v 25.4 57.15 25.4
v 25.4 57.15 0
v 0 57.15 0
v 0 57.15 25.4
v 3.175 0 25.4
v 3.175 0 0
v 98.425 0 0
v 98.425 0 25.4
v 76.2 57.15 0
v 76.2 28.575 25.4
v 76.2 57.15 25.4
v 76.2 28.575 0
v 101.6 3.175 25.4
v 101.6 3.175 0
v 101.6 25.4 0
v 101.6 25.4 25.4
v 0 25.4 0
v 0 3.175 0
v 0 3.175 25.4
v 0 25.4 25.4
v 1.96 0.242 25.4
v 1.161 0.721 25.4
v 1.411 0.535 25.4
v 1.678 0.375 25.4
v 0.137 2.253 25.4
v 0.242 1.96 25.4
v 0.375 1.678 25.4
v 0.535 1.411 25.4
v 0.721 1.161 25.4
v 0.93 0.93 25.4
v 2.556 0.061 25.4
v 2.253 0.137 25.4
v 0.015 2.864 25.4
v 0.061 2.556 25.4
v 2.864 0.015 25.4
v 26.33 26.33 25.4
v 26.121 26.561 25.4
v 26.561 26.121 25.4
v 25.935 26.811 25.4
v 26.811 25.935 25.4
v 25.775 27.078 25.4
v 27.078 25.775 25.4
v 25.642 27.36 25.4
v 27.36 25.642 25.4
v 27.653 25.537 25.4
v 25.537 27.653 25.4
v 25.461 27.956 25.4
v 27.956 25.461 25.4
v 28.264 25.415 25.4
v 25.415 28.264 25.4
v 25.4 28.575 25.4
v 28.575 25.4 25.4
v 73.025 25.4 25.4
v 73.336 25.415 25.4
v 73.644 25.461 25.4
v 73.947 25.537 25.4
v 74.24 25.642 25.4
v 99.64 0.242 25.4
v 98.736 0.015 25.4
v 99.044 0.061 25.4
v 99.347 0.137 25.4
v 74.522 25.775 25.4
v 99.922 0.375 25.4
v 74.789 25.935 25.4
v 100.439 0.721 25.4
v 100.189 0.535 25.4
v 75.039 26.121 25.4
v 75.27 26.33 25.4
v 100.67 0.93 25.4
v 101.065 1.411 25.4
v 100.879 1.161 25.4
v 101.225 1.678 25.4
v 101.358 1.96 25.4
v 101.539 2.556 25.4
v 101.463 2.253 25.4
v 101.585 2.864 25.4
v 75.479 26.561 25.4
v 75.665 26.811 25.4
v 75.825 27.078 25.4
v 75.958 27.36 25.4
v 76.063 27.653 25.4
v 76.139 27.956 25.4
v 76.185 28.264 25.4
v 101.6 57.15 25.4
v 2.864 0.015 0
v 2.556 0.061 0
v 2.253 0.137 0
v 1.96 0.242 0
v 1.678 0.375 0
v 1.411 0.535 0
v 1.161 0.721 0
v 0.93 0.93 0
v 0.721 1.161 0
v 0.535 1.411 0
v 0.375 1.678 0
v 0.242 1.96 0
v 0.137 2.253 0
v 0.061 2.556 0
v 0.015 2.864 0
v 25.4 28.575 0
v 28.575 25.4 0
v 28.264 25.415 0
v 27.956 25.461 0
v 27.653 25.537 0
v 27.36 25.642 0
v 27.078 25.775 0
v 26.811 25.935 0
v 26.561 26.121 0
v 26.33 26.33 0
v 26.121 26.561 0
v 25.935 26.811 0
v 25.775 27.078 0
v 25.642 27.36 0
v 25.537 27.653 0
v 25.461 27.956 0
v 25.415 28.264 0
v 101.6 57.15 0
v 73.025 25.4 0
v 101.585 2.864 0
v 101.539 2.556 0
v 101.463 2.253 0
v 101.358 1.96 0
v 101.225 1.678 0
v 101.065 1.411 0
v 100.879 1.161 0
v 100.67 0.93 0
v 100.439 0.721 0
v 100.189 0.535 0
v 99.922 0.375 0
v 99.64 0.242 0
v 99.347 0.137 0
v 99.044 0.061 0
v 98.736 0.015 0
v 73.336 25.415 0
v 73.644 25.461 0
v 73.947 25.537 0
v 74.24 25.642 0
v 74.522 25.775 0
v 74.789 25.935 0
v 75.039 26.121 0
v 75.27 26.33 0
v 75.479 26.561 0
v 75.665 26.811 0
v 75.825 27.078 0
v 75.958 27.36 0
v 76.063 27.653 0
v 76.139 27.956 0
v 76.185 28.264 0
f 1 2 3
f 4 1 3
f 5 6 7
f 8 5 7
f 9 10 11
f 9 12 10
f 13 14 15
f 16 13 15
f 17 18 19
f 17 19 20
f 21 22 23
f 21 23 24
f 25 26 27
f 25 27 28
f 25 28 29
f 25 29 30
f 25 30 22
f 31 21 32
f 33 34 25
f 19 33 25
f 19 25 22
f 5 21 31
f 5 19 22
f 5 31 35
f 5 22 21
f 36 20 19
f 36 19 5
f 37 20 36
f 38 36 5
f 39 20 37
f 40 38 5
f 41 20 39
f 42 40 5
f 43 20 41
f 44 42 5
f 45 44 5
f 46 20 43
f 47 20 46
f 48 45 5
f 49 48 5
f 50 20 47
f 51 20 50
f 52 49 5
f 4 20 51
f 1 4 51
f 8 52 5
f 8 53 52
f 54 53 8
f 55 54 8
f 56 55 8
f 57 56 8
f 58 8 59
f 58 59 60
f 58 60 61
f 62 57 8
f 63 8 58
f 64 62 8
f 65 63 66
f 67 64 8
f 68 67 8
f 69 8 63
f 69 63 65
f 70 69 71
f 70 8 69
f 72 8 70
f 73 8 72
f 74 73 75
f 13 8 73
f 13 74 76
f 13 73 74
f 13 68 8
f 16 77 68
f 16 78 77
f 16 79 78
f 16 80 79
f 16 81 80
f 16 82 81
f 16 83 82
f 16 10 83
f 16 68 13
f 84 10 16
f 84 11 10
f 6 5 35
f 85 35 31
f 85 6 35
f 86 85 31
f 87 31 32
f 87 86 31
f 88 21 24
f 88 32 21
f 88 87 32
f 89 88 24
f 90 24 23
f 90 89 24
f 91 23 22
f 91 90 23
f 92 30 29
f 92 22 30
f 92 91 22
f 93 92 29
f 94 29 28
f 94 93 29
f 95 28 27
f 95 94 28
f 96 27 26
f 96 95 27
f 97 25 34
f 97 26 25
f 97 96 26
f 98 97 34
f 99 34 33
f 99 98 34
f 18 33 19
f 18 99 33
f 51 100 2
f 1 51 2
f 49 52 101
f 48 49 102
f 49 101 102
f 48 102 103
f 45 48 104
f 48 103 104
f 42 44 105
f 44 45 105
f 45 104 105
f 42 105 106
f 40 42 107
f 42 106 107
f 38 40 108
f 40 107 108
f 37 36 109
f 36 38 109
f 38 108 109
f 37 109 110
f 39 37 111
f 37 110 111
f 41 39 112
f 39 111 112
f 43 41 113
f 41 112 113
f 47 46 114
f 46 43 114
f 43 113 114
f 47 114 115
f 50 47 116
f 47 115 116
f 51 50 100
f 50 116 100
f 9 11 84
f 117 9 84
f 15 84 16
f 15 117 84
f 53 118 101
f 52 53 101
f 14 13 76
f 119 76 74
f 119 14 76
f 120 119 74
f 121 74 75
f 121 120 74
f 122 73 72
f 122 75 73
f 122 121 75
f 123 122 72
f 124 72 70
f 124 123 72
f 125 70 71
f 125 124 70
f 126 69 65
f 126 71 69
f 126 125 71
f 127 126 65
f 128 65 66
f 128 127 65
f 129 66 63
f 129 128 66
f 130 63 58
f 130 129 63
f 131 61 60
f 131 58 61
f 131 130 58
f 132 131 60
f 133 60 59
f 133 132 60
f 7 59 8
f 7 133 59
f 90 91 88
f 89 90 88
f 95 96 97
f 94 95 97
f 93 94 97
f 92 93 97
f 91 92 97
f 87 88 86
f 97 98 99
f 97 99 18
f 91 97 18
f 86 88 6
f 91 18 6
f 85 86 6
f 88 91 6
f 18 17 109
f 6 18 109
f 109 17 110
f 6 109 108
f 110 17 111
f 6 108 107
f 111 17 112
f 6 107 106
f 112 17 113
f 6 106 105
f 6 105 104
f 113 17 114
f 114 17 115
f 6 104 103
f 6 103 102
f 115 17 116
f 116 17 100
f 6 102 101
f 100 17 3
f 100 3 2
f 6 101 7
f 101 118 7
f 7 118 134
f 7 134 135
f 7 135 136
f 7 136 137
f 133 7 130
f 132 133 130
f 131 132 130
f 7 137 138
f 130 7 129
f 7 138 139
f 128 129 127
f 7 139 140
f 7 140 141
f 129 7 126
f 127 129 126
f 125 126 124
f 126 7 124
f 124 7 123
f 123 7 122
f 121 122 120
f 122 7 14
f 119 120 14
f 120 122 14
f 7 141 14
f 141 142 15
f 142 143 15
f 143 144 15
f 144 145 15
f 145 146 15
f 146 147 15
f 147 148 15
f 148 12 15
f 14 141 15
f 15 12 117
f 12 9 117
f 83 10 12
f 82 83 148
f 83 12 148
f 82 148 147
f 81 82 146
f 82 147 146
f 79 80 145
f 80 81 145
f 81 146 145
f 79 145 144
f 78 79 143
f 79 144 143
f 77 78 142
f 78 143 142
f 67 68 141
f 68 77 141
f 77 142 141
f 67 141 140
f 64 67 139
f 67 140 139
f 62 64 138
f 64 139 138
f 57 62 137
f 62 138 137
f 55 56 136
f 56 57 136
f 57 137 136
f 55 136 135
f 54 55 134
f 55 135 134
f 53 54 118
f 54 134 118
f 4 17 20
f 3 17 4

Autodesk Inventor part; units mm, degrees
ref_plane "YZ Plane" through (0, 0, 0) normal (1, 0, 0) x (0, 1, 0)
ref_plane "XZ Plane" through (0, 0, 0) normal (0, 1, 0) x (-1, 0, 0)
ref_plane "XY Plane" through (0, 0, 0) normal (0, 0, 1) x (1, 0, 0)
sketch "Sketch1" plane through (0, 0, 0) normal (0, 0, 1) x (1, 0, 0)
  line L0 (-21.2406, 0) -> (122.8406, 0) projected
  line L1 (0, -12.2191) -> (0, 68.7115) projected
  line L2 (3.175, 0) -> (98.425, 0)
  line L3 (101.6, 3.175) -> (101.6, 25.4)
  line L4 (73.025, 25.4) -> (28.575, 25.4)
  line L5 (0, 25.4) -> (0, 3.175)
  line L6 (0, 25.4) -> (25.4, 25.4)
  line L7 (25.4, 28.575) -> (25.4, 57.15)
  line L8 (25.4, 57.15) -> (0, 57.15)
  line L9 (0, 57.15) -> (0, 25.4)
  line L10 (76.2, 57.15) -> (101.6, 57.15)
  line L11 (101.6, 57.15) -> (101.6, 25.4)
  line L12 (101.6, 25.4) -> (76.2, 25.4)
  line L13 (76.2, 28.575) -> (76.2, 57.15)
  arc A0 (25.4, 28.575) -> (28.575, 25.4) centre (28.575, 28.575) ccw
  arc A1 (73.025, 25.4) -> (76.2, 28.575) centre (73.025, 28.575) ccw
  arc A2 (98.425, 0) -> (101.6, 3.175) centre (98.425, 3.175) ccw
  arc A3 (0, 3.175) -> (3.175, 0) centre (3.175, 3.175) ccw
  point P0 (0, 0)
  point P1 (101.6, 0)
  dimension "d0" = 101.6
  dimension "d1" = 25.4
  dimension "d2" = 25.4
  dimension "d3" = 57.15
  dimension "d4" = 25.4
  dimension "d5" = 57.15
  dimension "d6" = 3.175
extrude "Extrusion1" add sketch "Sketch1" along normal blind 25.4 contours A3 L1 L8 L7 A0 L4 A1 L13 L10 L11 L3 A2 L0
properties part number "ferrite_core"
